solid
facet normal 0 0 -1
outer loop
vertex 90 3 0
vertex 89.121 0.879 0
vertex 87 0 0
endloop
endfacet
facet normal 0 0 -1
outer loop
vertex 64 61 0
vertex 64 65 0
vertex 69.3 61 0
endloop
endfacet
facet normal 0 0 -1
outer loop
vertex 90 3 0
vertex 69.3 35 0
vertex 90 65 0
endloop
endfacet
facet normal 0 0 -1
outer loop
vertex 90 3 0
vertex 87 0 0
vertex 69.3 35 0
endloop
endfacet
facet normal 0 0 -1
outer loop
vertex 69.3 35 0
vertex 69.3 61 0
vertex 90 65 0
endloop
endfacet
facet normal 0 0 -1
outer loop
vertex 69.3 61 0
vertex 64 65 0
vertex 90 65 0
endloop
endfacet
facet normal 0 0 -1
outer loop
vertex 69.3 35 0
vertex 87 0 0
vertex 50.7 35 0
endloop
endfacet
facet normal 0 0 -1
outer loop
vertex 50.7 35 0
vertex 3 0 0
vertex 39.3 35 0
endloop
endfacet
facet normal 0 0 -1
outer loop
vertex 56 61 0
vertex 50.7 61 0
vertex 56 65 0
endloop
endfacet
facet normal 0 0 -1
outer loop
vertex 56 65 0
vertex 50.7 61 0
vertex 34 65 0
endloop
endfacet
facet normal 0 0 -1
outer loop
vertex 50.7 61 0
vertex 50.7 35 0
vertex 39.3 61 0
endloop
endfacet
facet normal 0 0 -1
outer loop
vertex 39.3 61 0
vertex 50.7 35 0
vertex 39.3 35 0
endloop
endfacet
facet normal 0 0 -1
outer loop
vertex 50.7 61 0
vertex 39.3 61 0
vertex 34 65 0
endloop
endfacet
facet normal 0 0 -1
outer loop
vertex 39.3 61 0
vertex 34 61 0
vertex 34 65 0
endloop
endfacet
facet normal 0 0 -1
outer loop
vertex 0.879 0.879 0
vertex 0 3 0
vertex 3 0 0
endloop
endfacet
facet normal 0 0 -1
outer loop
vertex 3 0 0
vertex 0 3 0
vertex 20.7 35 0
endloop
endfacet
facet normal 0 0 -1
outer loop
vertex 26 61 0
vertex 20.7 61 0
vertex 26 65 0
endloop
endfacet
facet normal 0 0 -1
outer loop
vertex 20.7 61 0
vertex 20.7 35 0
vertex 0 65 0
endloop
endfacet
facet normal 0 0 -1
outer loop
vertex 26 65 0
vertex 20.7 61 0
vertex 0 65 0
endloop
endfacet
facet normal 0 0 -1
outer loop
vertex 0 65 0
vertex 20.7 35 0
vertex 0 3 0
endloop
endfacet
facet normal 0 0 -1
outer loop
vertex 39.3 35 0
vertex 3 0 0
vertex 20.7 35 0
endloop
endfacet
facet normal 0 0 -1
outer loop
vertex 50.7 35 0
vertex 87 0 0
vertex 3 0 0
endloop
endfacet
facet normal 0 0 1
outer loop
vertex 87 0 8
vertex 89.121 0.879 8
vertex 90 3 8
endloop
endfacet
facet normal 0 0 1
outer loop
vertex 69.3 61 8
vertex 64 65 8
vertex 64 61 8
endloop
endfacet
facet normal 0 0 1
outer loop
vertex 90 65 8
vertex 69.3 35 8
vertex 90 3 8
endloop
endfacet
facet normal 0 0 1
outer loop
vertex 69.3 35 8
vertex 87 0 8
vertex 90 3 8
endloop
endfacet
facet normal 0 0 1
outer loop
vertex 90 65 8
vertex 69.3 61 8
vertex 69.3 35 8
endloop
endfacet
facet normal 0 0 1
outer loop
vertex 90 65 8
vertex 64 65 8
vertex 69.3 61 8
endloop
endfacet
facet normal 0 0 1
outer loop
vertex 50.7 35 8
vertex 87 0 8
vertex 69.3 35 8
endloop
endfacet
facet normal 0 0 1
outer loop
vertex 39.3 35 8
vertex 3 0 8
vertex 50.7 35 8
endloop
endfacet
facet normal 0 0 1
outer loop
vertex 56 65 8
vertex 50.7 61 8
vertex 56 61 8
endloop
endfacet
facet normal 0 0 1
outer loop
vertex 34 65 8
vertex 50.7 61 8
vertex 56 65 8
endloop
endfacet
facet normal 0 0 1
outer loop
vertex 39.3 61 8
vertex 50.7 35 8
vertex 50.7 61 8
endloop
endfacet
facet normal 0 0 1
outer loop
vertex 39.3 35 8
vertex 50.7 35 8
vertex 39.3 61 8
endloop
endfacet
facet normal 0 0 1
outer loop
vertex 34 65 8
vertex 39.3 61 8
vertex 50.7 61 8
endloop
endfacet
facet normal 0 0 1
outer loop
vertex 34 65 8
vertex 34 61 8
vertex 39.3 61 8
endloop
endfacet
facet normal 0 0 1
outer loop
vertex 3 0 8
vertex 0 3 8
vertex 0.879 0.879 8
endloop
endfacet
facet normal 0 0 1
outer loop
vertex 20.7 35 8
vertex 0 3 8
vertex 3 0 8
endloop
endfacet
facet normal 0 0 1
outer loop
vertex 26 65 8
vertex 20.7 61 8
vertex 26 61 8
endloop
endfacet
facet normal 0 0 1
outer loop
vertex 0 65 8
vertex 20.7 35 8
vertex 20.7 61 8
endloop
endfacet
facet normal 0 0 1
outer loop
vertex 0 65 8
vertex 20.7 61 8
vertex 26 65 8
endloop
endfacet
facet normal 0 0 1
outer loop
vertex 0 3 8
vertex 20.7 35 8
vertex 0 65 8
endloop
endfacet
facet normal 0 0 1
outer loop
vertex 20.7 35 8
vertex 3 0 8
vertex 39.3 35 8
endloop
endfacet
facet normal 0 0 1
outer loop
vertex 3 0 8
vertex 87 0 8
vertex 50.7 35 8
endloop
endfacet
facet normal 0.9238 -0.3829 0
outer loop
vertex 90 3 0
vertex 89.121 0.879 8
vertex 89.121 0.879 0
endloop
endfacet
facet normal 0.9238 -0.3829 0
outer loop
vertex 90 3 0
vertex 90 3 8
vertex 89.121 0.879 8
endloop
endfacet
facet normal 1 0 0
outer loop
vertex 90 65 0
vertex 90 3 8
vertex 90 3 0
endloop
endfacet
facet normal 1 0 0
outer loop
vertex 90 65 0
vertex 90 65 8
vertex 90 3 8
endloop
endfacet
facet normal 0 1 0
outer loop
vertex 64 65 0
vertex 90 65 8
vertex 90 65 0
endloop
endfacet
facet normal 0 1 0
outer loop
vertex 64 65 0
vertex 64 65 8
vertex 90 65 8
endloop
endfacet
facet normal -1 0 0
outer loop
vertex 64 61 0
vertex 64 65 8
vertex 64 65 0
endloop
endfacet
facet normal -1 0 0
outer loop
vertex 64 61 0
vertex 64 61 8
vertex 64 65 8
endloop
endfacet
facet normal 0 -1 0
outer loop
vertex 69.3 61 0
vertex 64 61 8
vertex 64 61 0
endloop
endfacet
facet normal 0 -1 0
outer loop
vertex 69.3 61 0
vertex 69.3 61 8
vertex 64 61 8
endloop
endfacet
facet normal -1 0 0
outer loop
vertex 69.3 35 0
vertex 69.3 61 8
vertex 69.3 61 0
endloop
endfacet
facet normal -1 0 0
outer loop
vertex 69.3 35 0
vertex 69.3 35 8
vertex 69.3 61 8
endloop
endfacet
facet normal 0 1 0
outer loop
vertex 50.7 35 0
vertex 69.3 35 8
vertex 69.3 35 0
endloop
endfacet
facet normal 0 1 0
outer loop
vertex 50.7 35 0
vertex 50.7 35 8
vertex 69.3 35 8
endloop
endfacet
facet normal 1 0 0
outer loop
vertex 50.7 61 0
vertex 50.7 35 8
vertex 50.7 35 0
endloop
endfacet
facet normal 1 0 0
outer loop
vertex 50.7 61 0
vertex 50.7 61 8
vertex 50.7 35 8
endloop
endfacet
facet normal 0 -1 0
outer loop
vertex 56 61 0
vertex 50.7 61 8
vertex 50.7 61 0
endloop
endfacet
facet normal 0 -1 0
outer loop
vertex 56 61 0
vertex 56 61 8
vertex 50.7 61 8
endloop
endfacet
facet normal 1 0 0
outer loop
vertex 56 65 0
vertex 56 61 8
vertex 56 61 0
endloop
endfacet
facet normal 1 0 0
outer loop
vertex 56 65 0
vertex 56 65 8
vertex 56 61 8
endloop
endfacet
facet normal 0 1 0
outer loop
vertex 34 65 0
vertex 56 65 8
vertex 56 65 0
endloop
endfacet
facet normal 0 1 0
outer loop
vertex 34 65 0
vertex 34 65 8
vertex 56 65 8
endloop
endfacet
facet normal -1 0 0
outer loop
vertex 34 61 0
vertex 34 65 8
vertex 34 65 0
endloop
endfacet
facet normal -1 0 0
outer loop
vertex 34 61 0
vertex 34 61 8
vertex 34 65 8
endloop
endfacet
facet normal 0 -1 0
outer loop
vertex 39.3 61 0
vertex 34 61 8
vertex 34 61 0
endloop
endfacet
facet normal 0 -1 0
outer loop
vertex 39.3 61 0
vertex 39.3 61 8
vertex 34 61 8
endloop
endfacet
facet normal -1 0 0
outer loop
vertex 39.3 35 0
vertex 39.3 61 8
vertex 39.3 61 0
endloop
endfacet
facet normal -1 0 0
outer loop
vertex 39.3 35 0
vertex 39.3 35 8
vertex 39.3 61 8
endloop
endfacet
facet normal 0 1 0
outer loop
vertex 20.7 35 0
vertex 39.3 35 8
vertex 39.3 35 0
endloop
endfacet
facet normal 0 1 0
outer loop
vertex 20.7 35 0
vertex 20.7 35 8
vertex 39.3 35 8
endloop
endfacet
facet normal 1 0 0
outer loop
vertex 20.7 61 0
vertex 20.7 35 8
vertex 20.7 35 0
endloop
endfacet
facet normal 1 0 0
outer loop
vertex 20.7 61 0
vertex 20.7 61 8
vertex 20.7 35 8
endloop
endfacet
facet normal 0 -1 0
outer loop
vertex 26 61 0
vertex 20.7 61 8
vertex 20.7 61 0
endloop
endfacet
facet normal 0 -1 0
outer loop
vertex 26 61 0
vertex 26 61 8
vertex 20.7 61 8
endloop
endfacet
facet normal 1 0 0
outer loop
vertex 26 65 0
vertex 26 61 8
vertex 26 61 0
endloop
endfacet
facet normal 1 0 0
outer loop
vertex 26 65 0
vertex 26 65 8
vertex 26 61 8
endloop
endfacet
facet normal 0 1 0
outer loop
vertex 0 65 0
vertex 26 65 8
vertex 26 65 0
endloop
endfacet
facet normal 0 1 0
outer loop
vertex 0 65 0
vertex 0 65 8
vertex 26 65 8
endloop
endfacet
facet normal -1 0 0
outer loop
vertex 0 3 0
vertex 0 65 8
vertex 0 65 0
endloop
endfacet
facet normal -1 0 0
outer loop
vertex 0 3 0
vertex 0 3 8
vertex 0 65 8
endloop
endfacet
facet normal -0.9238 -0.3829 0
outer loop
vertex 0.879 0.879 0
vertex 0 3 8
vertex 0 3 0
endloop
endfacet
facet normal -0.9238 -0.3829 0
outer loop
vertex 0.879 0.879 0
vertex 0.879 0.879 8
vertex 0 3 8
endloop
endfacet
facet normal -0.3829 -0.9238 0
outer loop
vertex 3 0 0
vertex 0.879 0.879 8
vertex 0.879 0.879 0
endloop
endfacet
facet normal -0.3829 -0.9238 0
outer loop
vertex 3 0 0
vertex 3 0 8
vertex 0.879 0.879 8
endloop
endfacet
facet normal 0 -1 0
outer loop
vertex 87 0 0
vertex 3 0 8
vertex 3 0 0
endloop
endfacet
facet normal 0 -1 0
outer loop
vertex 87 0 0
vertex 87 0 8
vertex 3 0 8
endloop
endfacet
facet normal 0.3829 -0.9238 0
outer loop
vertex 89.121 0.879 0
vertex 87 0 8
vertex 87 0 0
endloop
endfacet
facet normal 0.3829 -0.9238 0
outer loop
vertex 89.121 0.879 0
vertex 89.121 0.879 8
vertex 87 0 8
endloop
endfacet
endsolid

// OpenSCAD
$fn = 32;

// ----------------------------------------------------------------------
// Window plate: 90 x 65 mm, 2 open windows
// ----------------------------------------------------------------------

// --- parameters (mm) ---
profile_height = 8;       // extrusion height
profile_points = 24;      // points of the closed outline

profile = [[0, 3], [0.879, 0.879], [3, 0], [87, 0], [89.121, 0.879], [90, 3], [90, 65], [64, 65], [64, 61], [69.3, 61], [69.3, 35], [50.7, 35], [50.7, 61], [56, 61], [56, 65], [34, 65], [34, 61], [39.3, 61], [39.3, 35], [20.7, 35], [20.7, 61], [26, 61], [26, 65], [0, 65]];  // single closed polygon, 24 points, counter clockwise

// --- the one profile operation ---
linear_extrude(height = profile_height) polygon(points = profile);
